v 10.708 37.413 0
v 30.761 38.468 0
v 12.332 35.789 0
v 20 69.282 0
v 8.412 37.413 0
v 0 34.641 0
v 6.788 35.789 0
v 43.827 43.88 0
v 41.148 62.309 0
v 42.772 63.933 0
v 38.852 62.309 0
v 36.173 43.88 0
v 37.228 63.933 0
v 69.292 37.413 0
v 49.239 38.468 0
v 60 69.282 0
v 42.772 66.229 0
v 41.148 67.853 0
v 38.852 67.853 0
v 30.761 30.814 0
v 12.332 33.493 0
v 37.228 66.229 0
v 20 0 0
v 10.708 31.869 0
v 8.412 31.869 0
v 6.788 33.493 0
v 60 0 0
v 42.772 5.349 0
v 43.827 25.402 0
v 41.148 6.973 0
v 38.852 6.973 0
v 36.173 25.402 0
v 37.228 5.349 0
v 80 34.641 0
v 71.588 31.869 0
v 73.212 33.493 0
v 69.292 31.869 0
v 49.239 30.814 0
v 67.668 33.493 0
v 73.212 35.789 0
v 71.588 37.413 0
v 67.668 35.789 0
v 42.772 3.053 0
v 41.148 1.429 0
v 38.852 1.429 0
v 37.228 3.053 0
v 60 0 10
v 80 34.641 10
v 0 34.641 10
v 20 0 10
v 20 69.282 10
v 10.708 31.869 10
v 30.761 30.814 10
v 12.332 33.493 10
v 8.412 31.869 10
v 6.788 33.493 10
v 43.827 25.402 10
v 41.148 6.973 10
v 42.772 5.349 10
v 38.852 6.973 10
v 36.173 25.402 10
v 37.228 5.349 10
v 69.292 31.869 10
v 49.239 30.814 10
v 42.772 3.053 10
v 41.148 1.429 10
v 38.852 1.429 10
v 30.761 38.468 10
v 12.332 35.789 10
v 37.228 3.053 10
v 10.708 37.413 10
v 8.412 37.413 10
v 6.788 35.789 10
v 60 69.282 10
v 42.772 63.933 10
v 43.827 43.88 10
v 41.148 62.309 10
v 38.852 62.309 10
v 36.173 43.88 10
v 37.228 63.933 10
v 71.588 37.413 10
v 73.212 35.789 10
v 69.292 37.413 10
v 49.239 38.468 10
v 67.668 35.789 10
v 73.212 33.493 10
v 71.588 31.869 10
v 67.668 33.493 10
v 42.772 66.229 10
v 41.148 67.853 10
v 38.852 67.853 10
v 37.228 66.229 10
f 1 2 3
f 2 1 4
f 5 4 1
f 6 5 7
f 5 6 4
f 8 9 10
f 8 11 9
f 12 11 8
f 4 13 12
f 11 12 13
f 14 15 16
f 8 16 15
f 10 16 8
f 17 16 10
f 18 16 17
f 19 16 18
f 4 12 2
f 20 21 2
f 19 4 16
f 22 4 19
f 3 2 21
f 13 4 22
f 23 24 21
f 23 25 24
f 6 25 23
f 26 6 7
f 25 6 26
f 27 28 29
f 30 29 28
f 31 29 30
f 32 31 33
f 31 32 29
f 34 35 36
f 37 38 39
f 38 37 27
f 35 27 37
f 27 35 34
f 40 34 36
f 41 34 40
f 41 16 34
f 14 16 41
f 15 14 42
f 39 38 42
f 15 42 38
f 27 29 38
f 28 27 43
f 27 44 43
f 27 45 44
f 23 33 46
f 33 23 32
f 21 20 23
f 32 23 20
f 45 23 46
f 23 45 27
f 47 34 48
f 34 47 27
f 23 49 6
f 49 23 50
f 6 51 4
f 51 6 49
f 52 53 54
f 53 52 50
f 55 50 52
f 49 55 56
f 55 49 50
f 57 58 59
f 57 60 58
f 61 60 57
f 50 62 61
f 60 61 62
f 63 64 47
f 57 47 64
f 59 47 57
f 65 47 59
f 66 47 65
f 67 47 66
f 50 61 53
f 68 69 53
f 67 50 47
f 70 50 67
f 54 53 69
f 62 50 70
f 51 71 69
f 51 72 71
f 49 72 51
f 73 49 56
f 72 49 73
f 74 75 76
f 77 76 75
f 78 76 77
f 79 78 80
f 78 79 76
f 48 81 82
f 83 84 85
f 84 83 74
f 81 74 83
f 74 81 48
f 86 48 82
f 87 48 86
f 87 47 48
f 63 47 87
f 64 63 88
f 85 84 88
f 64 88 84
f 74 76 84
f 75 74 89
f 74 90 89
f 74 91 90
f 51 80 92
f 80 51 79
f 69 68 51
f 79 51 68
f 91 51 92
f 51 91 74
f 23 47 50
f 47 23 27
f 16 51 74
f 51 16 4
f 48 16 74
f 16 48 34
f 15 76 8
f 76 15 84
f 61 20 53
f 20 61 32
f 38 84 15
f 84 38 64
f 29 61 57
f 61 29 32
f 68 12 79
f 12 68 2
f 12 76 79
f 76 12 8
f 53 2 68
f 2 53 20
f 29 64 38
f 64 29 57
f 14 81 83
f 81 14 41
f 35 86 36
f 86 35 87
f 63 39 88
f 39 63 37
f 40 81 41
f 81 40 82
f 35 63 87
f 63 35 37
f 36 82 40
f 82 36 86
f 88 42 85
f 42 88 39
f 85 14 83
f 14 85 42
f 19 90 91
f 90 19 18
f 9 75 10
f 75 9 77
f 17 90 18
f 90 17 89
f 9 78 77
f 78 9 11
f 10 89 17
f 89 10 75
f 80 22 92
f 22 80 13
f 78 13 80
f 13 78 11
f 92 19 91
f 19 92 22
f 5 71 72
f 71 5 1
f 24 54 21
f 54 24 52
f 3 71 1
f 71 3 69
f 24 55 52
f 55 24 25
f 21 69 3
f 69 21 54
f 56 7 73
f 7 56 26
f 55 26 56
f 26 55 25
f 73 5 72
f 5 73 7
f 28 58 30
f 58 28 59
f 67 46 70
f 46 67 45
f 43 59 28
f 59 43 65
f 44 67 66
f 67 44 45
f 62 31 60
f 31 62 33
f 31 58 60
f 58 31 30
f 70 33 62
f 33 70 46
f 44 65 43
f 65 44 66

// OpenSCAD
$fn = 32;

// ----------------------------------------------------------------------
// Polygon plate: 6-gon R40, 4 bolt windows
// ----------------------------------------------------------------------

// --- parameters (mm) ---
sides = 6;                // number of polygon sides
plate_r = 40;             // circumscribed radius of the polygon
bore_r = 10;              // centre bore radius
bolts = 4;                // number of bolt windows
ring_r = 30.44;           // bolt-circle radius
bolt_r = 3;               // bolt window radius
plate_t = 10;             // plate thickness, Z (extrusion height)

plate_d = 2 * plate_r;  // circumscribed diameter
bore_d = 2 * bore_r;  // centre bore diameter
bolt_d = 2 * bolt_r;  // bolt window diameter
ring_d = 2 * ring_r;  // bolt-circle diameter

profile = [[80, 34.641], [60, 69.282], [20, 69.282], [0, 34.641], [20, 0], [60, 0]];  // primary outline, 6 points, counter clockwise
void_1 = [[49.239, 38.468], [43.827, 43.88], [36.173, 43.88], [30.761, 38.468], [30.761, 30.814], [36.173, 25.402], [43.827, 25.402], [49.239, 30.814]];  // centre bore, 8 points
void_2 = [[73.212, 35.789], [71.588, 37.413], [69.292, 37.413], [67.668, 35.789], [67.668, 33.493], [69.292, 31.869], [71.588, 31.869], [73.212, 33.493]];  // bolt window 1, 8 points
void_3 = [[42.772, 66.229], [41.148, 67.853], [38.852, 67.853], [37.228, 66.229], [37.228, 63.933], [38.852, 62.309], [41.148, 62.309], [42.772, 63.933]];  // bolt window 2, 8 points
void_4 = [[12.332, 35.789], [10.708, 37.413], [8.412, 37.413], [6.788, 35.789], [6.788, 33.493], [8.412, 31.869], [10.708, 31.869], [12.332, 33.493]];  // bolt window 3, 8 points
void_5 = [[42.772, 5.349], [41.148, 6.973], [38.852, 6.973], [37.228, 5.349], [37.228, 3.053], [38.852, 1.429], [41.148, 1.429], [42.772, 3.053]];  // bolt window 4, 8 points

// --- the one profile operation ---
difference() {
  linear_extrude(height = plate_t) polygon(points = profile);
  translate([0, 0, -1])
    linear_extrude(height = plate_t + 2) polygon(points = void_1);
  translate([0, 0, -1])
    linear_extrude(height = plate_t + 2) polygon(points = void_2);
  translate([0, 0, -1])
    linear_extrude(height = plate_t + 2) polygon(points = void_3);
  translate([0, 0, -1])
    linear_extrude(height = plate_t + 2) polygon(points = void_4);
  translate([0, 0, -1])
    linear_extrude(height = plate_t + 2) polygon(points = void_5);
}
